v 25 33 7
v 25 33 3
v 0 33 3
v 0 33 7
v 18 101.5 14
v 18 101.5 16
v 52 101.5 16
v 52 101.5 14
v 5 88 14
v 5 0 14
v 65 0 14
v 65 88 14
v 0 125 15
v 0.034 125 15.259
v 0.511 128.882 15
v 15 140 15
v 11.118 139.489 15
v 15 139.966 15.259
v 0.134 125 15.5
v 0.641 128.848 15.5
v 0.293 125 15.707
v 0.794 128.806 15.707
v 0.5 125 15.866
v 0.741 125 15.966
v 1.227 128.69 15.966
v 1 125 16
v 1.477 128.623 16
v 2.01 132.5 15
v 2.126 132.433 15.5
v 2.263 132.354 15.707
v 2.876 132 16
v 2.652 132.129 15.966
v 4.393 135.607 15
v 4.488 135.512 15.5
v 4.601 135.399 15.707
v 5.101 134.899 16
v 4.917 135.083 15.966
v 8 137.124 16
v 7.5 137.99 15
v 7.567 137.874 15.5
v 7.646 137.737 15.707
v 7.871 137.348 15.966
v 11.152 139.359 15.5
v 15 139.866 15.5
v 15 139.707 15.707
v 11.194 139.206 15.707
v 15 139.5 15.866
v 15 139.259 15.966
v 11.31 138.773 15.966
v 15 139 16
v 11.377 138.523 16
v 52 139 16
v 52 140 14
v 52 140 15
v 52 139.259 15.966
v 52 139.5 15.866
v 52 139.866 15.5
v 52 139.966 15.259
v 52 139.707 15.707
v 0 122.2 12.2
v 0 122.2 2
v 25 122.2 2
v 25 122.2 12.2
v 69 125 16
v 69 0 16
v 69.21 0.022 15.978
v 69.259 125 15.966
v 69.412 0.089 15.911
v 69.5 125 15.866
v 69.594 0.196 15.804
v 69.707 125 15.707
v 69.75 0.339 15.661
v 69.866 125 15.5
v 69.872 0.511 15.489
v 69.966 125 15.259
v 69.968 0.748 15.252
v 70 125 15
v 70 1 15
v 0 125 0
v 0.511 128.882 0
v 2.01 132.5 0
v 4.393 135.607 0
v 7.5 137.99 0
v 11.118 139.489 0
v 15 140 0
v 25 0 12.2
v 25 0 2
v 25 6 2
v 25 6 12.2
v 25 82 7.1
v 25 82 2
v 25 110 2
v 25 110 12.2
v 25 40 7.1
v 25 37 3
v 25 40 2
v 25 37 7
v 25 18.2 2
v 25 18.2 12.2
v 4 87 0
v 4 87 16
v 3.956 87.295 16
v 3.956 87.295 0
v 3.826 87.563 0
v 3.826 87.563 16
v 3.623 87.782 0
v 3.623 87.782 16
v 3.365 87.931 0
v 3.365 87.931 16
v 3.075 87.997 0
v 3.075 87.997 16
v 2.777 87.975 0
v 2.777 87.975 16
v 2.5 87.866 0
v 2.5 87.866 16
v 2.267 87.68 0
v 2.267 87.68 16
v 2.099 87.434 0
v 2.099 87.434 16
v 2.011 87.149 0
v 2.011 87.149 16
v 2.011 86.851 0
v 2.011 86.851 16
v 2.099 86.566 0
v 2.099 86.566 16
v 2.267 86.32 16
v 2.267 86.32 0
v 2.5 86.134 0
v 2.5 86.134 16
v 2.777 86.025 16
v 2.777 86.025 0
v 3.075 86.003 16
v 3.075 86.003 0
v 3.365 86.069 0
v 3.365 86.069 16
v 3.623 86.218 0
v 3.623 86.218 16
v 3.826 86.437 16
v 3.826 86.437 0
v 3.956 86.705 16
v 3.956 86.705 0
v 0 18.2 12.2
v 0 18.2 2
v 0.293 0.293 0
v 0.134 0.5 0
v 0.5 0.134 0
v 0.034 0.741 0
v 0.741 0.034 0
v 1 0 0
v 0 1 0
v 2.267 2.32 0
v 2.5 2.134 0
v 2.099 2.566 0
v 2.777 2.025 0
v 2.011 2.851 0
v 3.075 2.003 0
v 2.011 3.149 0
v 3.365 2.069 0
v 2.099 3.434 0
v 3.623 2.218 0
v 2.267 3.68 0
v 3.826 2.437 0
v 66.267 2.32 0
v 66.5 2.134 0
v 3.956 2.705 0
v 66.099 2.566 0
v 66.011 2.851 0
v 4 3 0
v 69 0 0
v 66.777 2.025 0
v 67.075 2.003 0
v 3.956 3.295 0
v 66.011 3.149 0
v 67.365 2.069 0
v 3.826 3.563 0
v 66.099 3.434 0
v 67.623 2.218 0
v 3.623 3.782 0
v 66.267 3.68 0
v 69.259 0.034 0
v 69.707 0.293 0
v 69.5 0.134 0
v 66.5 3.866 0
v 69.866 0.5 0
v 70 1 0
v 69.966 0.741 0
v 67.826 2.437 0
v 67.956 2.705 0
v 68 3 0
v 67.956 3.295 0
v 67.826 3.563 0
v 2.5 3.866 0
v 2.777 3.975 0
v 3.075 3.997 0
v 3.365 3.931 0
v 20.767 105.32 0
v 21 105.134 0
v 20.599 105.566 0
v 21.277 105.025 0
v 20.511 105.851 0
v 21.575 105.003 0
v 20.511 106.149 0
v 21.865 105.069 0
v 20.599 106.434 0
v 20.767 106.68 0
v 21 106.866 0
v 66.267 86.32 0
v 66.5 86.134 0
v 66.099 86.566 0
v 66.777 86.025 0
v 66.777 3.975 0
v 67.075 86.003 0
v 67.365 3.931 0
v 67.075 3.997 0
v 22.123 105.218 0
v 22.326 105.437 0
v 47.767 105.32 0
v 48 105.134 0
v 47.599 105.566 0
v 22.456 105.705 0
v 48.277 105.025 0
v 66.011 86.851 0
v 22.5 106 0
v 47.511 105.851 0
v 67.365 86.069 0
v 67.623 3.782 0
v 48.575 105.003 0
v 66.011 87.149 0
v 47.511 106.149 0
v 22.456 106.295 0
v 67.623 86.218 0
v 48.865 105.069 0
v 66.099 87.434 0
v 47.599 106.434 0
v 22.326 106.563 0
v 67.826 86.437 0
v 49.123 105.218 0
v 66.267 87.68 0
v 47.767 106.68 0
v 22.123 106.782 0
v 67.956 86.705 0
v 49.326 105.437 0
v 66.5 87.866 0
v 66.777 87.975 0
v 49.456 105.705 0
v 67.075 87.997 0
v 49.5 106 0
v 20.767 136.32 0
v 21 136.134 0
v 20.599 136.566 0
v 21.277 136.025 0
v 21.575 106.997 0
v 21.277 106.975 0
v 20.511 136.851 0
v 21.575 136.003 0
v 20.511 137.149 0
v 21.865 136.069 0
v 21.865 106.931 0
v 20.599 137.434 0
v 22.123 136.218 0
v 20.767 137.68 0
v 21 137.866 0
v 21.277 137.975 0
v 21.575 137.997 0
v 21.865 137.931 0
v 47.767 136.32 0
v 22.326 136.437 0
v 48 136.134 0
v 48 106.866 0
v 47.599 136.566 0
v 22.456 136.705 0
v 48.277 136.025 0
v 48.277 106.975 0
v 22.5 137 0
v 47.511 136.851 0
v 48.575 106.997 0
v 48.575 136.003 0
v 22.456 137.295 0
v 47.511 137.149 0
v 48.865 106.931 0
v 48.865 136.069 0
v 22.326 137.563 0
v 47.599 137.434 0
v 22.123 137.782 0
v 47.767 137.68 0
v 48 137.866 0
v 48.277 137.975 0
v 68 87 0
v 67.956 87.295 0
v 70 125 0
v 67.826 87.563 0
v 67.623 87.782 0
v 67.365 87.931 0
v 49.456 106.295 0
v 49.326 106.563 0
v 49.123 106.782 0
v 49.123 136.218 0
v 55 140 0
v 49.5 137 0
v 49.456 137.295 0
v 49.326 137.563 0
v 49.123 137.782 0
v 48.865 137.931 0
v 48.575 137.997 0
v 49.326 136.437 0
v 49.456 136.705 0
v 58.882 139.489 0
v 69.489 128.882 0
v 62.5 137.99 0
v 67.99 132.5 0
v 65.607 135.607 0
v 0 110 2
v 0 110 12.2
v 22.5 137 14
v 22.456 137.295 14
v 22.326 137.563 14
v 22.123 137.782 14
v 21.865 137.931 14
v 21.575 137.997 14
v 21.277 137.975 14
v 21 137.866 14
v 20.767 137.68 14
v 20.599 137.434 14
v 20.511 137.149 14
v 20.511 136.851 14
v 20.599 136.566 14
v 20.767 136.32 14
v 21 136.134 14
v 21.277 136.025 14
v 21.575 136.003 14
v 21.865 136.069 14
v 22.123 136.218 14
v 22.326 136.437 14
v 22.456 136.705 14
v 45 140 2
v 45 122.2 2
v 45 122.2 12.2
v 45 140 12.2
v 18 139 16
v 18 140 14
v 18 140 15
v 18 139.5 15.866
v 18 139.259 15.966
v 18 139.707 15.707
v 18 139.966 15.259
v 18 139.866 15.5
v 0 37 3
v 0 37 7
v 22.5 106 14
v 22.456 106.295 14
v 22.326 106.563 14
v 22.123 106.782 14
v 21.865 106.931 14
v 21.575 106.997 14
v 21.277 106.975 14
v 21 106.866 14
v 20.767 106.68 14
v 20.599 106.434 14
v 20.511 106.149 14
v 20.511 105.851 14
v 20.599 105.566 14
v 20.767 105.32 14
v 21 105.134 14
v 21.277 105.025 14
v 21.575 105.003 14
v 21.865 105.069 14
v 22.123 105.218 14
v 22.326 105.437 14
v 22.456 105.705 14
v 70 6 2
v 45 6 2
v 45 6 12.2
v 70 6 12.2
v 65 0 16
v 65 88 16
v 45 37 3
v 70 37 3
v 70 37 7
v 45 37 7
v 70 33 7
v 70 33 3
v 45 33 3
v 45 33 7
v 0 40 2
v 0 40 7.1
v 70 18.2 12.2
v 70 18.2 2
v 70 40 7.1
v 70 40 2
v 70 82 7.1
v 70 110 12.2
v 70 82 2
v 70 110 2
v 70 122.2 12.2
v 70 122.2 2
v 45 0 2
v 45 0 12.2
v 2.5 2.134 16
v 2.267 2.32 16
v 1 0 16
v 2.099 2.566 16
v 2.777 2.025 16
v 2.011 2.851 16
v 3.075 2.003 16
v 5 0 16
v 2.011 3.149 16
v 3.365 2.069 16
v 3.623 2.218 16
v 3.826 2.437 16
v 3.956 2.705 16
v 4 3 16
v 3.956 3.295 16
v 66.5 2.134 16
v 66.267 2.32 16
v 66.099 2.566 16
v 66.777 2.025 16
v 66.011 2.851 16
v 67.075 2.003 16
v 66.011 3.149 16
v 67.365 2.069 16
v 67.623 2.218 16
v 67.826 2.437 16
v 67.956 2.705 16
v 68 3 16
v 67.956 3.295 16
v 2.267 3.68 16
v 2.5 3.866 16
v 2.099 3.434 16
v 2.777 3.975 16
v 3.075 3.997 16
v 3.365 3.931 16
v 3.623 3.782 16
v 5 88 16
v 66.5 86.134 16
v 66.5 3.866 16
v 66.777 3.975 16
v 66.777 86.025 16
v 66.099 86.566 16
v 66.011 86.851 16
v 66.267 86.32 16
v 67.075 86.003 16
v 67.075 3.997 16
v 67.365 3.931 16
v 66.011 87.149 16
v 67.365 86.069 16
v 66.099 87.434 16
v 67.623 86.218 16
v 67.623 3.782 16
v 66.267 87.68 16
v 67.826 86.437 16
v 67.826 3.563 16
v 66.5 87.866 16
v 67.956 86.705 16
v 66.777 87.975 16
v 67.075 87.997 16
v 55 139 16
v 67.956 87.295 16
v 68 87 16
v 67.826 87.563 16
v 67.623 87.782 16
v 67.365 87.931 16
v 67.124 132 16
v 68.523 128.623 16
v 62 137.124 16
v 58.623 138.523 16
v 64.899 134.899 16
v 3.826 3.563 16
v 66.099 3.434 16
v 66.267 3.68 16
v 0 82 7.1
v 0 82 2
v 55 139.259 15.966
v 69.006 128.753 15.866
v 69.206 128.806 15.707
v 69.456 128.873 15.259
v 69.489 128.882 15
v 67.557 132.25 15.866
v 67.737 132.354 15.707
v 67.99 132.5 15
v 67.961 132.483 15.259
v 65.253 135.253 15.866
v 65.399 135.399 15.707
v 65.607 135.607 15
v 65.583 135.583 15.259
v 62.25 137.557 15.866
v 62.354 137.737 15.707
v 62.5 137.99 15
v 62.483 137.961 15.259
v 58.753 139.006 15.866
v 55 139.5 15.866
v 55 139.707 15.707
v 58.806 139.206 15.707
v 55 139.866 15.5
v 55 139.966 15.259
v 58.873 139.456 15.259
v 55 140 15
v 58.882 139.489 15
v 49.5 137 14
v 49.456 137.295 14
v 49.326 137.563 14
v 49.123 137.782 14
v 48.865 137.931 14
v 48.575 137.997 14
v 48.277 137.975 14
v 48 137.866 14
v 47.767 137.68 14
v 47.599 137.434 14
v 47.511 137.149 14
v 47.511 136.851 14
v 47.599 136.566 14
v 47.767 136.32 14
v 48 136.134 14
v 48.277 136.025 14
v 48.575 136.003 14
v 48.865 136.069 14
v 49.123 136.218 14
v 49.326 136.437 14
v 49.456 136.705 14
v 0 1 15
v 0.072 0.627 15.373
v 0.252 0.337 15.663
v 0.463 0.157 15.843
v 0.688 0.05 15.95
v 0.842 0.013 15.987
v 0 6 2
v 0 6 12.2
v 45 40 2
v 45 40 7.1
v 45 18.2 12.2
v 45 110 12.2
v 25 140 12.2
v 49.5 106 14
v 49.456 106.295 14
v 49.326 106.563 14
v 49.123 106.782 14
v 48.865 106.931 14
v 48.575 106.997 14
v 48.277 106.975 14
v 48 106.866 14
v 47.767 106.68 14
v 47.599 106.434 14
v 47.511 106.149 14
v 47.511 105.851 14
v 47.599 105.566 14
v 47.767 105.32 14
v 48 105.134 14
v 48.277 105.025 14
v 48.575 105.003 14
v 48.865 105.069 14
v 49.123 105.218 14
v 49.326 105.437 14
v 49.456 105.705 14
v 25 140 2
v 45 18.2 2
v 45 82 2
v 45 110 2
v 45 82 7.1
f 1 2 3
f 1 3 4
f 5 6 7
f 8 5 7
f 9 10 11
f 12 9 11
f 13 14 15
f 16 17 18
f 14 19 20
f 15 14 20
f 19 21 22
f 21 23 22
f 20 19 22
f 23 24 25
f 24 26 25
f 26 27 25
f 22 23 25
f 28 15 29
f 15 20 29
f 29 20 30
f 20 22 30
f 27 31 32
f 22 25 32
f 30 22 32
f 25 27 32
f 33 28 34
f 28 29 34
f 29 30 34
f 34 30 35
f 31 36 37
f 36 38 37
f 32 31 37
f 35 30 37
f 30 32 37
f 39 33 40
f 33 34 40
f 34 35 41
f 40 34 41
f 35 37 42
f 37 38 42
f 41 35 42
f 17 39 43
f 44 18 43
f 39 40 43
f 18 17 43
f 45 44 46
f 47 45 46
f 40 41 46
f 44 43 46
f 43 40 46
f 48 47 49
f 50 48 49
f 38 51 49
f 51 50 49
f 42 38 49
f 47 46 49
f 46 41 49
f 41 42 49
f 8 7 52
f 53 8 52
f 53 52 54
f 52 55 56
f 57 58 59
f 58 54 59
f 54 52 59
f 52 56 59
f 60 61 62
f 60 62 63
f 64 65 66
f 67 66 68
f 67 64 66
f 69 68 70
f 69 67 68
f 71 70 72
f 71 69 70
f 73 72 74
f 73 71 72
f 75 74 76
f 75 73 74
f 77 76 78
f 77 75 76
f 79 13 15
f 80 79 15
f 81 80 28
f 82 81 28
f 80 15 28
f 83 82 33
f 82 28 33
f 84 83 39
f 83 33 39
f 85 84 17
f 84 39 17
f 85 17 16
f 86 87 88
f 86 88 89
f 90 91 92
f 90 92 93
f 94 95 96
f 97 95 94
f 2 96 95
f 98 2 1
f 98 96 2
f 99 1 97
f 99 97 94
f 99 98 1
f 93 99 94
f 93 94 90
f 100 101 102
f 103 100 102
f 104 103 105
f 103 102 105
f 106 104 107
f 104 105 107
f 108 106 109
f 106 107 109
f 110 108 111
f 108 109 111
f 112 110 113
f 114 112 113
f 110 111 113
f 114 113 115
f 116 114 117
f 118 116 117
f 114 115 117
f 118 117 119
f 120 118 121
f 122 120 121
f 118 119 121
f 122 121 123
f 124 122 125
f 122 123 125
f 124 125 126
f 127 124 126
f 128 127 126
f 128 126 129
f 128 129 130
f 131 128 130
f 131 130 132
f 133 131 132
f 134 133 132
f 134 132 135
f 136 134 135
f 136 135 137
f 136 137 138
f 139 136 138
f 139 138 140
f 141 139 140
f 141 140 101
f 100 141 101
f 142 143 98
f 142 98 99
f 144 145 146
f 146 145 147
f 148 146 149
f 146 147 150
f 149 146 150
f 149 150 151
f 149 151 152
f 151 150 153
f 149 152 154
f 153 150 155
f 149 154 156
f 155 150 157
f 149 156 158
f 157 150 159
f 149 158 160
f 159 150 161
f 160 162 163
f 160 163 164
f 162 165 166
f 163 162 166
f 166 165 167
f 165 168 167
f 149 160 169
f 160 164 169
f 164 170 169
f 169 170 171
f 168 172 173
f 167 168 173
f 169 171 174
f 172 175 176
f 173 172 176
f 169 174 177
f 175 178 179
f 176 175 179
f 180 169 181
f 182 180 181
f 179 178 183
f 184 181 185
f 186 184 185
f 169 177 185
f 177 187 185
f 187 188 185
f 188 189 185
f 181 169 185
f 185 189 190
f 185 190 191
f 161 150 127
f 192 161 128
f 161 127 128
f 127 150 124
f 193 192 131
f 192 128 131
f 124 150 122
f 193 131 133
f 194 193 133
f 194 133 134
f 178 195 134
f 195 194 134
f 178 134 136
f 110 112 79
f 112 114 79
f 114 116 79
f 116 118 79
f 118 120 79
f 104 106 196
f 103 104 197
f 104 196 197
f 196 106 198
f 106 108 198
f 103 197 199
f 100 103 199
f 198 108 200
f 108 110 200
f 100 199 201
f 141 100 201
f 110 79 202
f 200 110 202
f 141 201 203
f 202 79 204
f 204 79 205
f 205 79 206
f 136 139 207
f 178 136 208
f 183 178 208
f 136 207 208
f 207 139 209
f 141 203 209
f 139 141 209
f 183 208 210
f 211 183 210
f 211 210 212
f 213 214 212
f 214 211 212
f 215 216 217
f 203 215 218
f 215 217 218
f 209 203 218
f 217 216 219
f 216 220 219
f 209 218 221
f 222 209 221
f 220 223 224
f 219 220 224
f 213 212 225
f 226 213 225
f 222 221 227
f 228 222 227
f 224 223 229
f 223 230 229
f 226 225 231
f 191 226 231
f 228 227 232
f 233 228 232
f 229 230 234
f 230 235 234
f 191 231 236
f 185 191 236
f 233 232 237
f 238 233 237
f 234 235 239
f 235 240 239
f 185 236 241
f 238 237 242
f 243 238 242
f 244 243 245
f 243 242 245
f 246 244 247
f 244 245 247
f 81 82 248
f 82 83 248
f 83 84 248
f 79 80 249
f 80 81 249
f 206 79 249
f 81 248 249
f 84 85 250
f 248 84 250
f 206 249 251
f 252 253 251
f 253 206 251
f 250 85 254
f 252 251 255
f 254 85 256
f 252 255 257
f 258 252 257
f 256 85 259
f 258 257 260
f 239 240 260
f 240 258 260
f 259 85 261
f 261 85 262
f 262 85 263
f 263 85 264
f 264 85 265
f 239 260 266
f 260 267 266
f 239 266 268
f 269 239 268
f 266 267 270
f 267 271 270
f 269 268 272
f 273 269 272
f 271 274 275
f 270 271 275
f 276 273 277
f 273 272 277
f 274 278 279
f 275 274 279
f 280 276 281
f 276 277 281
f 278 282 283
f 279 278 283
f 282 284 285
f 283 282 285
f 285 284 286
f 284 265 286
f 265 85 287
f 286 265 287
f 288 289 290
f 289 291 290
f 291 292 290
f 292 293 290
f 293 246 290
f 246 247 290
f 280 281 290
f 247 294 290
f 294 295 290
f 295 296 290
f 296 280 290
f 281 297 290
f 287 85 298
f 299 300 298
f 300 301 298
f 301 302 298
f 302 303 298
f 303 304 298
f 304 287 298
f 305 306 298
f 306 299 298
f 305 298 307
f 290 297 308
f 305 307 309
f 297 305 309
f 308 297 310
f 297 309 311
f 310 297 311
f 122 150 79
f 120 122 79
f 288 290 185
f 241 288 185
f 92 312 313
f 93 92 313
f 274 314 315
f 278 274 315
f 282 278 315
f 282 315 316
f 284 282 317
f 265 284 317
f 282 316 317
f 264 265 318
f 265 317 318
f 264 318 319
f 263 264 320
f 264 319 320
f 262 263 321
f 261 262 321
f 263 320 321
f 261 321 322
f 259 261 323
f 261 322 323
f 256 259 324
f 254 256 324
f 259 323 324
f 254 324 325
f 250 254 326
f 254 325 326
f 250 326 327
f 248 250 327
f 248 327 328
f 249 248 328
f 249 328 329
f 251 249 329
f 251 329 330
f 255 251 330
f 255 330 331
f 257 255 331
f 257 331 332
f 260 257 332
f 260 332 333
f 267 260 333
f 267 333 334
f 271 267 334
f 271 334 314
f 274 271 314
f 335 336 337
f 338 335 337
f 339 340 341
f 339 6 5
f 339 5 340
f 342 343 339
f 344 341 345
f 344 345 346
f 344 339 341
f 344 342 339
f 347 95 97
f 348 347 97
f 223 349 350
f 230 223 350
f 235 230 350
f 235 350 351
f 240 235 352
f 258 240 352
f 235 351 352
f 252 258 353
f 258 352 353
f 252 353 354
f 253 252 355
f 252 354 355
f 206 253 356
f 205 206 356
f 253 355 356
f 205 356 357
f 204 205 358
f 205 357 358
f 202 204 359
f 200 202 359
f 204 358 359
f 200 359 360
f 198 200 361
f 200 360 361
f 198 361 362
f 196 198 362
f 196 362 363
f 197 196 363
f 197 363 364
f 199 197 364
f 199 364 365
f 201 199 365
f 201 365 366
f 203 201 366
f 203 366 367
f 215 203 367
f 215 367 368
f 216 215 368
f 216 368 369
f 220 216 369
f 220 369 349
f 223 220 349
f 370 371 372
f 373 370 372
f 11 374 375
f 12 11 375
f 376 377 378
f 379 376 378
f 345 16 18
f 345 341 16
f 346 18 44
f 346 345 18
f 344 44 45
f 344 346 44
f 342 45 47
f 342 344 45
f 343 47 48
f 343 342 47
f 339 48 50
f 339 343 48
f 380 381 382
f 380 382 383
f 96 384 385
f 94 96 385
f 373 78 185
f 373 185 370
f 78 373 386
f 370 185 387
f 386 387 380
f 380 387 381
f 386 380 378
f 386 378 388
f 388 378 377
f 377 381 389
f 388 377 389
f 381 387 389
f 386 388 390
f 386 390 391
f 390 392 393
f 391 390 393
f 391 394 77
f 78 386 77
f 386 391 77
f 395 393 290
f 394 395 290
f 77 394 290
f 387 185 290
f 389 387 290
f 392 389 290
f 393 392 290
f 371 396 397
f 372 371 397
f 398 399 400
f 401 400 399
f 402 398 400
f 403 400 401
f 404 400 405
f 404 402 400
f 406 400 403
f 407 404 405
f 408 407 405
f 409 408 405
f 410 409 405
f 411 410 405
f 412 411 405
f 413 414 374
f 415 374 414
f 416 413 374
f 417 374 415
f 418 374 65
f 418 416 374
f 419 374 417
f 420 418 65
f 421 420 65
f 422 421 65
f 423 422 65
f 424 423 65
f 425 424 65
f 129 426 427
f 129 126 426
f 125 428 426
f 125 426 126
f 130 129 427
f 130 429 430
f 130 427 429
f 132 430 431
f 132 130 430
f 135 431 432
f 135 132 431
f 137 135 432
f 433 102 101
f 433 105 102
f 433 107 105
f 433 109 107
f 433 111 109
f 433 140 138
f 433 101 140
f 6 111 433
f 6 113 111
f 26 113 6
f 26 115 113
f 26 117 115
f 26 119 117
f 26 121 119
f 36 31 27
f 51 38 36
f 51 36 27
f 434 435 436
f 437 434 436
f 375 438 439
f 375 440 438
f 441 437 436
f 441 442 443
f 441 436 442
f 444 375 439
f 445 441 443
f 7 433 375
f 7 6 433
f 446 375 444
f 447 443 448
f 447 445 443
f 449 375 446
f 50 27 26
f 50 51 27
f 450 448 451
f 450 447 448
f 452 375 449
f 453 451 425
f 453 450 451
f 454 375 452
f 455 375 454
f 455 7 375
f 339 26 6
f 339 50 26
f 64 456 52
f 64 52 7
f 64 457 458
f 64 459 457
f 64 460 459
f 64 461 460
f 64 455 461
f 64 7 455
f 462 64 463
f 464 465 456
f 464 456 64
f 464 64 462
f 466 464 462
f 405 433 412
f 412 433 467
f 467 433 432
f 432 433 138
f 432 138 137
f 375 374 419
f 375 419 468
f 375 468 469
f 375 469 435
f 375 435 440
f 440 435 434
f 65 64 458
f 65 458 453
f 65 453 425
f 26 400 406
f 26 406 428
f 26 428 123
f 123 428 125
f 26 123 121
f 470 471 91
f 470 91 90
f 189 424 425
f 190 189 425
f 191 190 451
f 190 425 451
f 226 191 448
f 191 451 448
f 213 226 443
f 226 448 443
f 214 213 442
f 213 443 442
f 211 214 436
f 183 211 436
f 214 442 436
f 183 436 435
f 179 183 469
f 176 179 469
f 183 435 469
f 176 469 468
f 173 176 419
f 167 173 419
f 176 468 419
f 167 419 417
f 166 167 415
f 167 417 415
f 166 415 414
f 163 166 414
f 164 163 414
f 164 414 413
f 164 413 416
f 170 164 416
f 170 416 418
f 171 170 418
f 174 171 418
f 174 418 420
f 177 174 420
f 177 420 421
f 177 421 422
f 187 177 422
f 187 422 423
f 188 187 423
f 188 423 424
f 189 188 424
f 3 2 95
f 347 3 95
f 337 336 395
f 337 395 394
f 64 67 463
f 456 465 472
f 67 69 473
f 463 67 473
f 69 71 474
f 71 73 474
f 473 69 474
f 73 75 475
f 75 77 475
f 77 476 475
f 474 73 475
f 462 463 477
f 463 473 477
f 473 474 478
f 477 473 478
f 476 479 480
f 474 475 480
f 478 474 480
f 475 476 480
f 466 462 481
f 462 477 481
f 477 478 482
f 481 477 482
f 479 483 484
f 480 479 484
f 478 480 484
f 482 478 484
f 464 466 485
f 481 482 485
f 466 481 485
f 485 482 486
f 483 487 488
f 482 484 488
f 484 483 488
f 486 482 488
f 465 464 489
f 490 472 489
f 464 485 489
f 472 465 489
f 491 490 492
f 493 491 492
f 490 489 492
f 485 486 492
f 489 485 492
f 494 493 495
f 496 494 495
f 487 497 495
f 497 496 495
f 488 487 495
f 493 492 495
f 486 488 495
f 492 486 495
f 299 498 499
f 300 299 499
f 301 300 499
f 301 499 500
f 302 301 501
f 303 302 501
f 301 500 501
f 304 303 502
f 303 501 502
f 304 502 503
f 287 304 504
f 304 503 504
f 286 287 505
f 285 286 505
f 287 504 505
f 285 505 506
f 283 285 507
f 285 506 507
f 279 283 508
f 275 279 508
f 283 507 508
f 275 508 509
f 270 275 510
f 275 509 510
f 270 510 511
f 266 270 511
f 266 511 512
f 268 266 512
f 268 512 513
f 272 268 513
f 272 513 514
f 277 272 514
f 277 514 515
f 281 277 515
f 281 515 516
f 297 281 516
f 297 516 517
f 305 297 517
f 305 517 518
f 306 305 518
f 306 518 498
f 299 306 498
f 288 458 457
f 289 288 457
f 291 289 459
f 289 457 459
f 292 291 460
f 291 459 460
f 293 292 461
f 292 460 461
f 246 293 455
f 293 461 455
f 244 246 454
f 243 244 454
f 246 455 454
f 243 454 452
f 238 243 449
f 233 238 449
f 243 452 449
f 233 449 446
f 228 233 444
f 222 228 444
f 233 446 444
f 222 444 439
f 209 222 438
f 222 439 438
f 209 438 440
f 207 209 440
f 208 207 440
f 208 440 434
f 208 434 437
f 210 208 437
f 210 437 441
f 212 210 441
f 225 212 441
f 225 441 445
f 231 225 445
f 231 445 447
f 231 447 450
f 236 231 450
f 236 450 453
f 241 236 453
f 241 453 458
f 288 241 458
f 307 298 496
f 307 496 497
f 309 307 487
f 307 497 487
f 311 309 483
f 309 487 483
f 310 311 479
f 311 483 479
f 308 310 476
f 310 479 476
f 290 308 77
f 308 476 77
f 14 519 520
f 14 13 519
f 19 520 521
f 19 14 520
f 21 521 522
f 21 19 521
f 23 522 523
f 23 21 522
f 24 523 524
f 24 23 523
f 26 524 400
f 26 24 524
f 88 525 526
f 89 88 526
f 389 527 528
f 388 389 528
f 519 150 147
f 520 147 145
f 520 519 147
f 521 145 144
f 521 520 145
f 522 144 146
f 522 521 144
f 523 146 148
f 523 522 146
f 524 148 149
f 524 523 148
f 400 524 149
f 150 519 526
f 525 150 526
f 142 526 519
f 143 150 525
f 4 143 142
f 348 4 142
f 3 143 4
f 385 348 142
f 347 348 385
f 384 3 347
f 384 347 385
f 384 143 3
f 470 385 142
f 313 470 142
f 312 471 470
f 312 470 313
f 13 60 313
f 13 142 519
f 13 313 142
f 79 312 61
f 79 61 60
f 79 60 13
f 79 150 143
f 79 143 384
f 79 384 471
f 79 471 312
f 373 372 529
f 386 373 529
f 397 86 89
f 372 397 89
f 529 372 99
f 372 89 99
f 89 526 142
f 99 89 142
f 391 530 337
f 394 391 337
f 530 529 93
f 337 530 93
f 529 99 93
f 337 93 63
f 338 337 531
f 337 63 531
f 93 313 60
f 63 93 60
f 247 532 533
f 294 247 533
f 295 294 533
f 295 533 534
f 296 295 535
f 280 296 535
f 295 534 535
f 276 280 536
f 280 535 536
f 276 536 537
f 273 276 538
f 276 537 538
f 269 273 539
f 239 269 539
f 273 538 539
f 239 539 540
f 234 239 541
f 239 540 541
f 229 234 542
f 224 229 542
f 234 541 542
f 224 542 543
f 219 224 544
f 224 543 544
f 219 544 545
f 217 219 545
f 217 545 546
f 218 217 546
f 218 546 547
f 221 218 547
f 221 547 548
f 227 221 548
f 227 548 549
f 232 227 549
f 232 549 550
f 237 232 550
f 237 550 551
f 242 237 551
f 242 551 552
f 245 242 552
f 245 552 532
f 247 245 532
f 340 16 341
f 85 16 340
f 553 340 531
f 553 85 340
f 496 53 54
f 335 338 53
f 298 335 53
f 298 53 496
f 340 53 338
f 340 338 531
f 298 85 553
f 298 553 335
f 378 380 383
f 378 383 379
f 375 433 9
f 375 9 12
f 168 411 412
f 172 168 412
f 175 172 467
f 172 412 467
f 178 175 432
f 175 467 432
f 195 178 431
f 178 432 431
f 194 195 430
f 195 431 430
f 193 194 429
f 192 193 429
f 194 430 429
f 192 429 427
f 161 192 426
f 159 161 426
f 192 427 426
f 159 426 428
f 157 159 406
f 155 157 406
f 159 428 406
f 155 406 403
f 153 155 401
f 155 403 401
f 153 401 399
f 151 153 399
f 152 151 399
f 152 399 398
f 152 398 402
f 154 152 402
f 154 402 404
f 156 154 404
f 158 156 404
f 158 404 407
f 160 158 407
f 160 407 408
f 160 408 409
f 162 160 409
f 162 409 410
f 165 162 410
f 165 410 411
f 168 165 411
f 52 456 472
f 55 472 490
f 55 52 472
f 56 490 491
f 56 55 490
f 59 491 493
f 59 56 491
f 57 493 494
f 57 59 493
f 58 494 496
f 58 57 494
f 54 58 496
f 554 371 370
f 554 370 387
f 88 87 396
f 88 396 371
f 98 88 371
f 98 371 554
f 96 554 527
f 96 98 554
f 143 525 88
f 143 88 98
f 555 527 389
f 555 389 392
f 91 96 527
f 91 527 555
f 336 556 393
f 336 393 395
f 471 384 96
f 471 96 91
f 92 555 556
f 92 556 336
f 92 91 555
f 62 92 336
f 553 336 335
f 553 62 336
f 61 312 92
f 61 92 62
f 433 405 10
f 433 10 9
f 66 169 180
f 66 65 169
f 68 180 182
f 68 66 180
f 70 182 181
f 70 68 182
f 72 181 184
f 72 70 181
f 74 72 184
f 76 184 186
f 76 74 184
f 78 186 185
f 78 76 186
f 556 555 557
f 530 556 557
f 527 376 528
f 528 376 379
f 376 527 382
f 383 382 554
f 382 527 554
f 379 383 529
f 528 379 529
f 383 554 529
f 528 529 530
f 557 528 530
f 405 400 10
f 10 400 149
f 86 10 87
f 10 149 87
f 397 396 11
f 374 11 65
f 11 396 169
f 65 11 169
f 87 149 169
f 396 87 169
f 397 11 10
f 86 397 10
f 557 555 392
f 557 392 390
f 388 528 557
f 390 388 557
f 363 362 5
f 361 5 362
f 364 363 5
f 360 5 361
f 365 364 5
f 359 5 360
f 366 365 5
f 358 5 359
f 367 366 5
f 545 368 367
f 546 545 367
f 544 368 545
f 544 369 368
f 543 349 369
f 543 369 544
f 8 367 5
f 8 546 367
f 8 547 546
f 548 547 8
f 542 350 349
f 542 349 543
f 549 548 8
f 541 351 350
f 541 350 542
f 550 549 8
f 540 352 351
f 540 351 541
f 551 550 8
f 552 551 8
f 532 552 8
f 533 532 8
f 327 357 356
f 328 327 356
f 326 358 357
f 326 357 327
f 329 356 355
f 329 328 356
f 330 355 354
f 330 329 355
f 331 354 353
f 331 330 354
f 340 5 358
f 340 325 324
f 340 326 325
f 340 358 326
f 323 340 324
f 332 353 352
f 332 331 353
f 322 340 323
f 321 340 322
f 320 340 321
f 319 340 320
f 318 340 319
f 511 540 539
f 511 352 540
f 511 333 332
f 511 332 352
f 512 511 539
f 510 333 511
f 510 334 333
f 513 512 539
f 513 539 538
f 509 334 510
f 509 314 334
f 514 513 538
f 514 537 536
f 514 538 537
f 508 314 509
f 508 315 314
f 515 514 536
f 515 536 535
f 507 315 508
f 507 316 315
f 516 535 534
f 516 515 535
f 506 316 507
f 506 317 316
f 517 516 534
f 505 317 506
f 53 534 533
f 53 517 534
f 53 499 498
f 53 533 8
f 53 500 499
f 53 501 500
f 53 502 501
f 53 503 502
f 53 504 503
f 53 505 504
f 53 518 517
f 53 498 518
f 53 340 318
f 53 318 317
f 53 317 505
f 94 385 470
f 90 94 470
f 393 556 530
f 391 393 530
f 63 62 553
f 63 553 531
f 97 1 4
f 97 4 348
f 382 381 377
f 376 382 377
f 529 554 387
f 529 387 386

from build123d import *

# Parameters (mm, degrees)
BOX_W           = 70
BOX_H           = 140
BOX_DEPTH       = 16
SKETCH_R        = 1
POCKET_DEPTH    = 20
SKETCH001_W     = 12.2
SKETCH001_H     = 10.2
SKETCH001_W_2   = 42
SKETCH001_H_2   = 5.1
POCKET001_DEPTH = 75
SKETCH002_W     = 20
SKETCH002_H     = 10.2
POCKET002_DEPTH = 140
SKETCH003_W     = 34
SKETCH003_H     = 38.5
SKETCH003_W_2   = 60
SKETCH003_H_2   = 90
POCKET003_DEPTH = 2
SKETCH004_W     = 4
SKETCH004_H     = 4
POCKET004_DEPTH = 80
FILLET_R        = 15
FILLET001_R     = 1


with BuildPart() as part:
    # Box → Box (new body)
    with BuildSketch(Plane.XY):
        with Locations((35, 70)):
            Rectangle(BOX_W, BOX_H)
    extrude(amount=BOX_DEPTH)

    # Sketch (on Face6 of BaseFeature) → Pocket (cut)
    with BuildSketch(Plane.XY.offset(16)):
        with Locations((3, 3)):
            Circle(SKETCH_R)
        with Locations((67, 3)):
            Circle(SKETCH_R)
        with Locations((3, 87)):
            Circle(SKETCH_R)
        with Locations((67, 87)):
            Circle(SKETCH_R)
        with Locations((21.5, 137)):
            Circle(SKETCH_R)
        with Locations((48.5, 137)):
            Circle(SKETCH_R)
        with Locations((21.5, 106)):
            Circle(SKETCH_R)
        with Locations((48.5, 106)):
            Circle(SKETCH_R)
    extrude(amount=-POCKET_DEPTH, mode=Mode.SUBTRACT)

    # Sketch001 → Pocket001 (cut)
    with BuildSketch(Plane.YZ):
        with Locations((12.1, 7.1)):
            Rectangle(SKETCH001_W, SKETCH001_H)
        with Locations((116.1, 7.1)):
            Rectangle(SKETCH001_W, SKETCH001_H)
        with Locations((61, 4.55)):
            Rectangle(SKETCH001_W_2, SKETCH001_H_2)
    extrude(amount=POCKET001_DEPTH, mode=Mode.SUBTRACT)

    # Sketch002 → Pocket002 (cut)
    with BuildSketch(Plane.XZ):
        with Locations((35, 7.1)):
            Rectangle(SKETCH002_W, SKETCH002_H)
    extrude(amount=-POCKET002_DEPTH, mode=Mode.SUBTRACT)

    # Sketch003 (on Face3 of Pocket002) → Pocket003 (cut)
    with BuildSketch(Plane.XY.offset(16)):
        with Locations((35, 120.75)):
            Rectangle(SKETCH003_W, SKETCH003_H)
        with Locations((35, 43)):
            Rectangle(SKETCH003_W_2, SKETCH003_H_2)
    extrude(amount=-POCKET003_DEPTH, mode=Mode.SUBTRACT)

    # Sketch004 (on Face18 of Pocket003) → Pocket004 (cut)
    with BuildSketch(Plane.YZ.offset(70)):
        with Locations((35, 5)):
            Rectangle(SKETCH004_W, SKETCH004_H)
    extrude(amount=-POCKET004_DEPTH, mode=Mode.SUBTRACT)

    # Fillet
    fillet_edges = [part.edges().sort_by_distance(p)[0] for p in [
        (0, 140, 8),
        (70, 140, 8),
    ]]
    fillet(fillet_edges, radius=FILLET_R)

    # Fillet001
    fillet001_edges = [part.edges().sort_by_distance(p)[0] for p in [
        (70, 0, 8),
        (0, 0, 8),
        (70, 62.5, 16),
        (0, 62.5, 16),
        (65.606602, 135.606602, 16),
        (53.5, 140, 16),
        (16.5, 140, 16),
        (4.393398, 135.606602, 16),
    ]]
    fillet(fillet001_edges, radius=FILLET001_R)


solid = part.part
